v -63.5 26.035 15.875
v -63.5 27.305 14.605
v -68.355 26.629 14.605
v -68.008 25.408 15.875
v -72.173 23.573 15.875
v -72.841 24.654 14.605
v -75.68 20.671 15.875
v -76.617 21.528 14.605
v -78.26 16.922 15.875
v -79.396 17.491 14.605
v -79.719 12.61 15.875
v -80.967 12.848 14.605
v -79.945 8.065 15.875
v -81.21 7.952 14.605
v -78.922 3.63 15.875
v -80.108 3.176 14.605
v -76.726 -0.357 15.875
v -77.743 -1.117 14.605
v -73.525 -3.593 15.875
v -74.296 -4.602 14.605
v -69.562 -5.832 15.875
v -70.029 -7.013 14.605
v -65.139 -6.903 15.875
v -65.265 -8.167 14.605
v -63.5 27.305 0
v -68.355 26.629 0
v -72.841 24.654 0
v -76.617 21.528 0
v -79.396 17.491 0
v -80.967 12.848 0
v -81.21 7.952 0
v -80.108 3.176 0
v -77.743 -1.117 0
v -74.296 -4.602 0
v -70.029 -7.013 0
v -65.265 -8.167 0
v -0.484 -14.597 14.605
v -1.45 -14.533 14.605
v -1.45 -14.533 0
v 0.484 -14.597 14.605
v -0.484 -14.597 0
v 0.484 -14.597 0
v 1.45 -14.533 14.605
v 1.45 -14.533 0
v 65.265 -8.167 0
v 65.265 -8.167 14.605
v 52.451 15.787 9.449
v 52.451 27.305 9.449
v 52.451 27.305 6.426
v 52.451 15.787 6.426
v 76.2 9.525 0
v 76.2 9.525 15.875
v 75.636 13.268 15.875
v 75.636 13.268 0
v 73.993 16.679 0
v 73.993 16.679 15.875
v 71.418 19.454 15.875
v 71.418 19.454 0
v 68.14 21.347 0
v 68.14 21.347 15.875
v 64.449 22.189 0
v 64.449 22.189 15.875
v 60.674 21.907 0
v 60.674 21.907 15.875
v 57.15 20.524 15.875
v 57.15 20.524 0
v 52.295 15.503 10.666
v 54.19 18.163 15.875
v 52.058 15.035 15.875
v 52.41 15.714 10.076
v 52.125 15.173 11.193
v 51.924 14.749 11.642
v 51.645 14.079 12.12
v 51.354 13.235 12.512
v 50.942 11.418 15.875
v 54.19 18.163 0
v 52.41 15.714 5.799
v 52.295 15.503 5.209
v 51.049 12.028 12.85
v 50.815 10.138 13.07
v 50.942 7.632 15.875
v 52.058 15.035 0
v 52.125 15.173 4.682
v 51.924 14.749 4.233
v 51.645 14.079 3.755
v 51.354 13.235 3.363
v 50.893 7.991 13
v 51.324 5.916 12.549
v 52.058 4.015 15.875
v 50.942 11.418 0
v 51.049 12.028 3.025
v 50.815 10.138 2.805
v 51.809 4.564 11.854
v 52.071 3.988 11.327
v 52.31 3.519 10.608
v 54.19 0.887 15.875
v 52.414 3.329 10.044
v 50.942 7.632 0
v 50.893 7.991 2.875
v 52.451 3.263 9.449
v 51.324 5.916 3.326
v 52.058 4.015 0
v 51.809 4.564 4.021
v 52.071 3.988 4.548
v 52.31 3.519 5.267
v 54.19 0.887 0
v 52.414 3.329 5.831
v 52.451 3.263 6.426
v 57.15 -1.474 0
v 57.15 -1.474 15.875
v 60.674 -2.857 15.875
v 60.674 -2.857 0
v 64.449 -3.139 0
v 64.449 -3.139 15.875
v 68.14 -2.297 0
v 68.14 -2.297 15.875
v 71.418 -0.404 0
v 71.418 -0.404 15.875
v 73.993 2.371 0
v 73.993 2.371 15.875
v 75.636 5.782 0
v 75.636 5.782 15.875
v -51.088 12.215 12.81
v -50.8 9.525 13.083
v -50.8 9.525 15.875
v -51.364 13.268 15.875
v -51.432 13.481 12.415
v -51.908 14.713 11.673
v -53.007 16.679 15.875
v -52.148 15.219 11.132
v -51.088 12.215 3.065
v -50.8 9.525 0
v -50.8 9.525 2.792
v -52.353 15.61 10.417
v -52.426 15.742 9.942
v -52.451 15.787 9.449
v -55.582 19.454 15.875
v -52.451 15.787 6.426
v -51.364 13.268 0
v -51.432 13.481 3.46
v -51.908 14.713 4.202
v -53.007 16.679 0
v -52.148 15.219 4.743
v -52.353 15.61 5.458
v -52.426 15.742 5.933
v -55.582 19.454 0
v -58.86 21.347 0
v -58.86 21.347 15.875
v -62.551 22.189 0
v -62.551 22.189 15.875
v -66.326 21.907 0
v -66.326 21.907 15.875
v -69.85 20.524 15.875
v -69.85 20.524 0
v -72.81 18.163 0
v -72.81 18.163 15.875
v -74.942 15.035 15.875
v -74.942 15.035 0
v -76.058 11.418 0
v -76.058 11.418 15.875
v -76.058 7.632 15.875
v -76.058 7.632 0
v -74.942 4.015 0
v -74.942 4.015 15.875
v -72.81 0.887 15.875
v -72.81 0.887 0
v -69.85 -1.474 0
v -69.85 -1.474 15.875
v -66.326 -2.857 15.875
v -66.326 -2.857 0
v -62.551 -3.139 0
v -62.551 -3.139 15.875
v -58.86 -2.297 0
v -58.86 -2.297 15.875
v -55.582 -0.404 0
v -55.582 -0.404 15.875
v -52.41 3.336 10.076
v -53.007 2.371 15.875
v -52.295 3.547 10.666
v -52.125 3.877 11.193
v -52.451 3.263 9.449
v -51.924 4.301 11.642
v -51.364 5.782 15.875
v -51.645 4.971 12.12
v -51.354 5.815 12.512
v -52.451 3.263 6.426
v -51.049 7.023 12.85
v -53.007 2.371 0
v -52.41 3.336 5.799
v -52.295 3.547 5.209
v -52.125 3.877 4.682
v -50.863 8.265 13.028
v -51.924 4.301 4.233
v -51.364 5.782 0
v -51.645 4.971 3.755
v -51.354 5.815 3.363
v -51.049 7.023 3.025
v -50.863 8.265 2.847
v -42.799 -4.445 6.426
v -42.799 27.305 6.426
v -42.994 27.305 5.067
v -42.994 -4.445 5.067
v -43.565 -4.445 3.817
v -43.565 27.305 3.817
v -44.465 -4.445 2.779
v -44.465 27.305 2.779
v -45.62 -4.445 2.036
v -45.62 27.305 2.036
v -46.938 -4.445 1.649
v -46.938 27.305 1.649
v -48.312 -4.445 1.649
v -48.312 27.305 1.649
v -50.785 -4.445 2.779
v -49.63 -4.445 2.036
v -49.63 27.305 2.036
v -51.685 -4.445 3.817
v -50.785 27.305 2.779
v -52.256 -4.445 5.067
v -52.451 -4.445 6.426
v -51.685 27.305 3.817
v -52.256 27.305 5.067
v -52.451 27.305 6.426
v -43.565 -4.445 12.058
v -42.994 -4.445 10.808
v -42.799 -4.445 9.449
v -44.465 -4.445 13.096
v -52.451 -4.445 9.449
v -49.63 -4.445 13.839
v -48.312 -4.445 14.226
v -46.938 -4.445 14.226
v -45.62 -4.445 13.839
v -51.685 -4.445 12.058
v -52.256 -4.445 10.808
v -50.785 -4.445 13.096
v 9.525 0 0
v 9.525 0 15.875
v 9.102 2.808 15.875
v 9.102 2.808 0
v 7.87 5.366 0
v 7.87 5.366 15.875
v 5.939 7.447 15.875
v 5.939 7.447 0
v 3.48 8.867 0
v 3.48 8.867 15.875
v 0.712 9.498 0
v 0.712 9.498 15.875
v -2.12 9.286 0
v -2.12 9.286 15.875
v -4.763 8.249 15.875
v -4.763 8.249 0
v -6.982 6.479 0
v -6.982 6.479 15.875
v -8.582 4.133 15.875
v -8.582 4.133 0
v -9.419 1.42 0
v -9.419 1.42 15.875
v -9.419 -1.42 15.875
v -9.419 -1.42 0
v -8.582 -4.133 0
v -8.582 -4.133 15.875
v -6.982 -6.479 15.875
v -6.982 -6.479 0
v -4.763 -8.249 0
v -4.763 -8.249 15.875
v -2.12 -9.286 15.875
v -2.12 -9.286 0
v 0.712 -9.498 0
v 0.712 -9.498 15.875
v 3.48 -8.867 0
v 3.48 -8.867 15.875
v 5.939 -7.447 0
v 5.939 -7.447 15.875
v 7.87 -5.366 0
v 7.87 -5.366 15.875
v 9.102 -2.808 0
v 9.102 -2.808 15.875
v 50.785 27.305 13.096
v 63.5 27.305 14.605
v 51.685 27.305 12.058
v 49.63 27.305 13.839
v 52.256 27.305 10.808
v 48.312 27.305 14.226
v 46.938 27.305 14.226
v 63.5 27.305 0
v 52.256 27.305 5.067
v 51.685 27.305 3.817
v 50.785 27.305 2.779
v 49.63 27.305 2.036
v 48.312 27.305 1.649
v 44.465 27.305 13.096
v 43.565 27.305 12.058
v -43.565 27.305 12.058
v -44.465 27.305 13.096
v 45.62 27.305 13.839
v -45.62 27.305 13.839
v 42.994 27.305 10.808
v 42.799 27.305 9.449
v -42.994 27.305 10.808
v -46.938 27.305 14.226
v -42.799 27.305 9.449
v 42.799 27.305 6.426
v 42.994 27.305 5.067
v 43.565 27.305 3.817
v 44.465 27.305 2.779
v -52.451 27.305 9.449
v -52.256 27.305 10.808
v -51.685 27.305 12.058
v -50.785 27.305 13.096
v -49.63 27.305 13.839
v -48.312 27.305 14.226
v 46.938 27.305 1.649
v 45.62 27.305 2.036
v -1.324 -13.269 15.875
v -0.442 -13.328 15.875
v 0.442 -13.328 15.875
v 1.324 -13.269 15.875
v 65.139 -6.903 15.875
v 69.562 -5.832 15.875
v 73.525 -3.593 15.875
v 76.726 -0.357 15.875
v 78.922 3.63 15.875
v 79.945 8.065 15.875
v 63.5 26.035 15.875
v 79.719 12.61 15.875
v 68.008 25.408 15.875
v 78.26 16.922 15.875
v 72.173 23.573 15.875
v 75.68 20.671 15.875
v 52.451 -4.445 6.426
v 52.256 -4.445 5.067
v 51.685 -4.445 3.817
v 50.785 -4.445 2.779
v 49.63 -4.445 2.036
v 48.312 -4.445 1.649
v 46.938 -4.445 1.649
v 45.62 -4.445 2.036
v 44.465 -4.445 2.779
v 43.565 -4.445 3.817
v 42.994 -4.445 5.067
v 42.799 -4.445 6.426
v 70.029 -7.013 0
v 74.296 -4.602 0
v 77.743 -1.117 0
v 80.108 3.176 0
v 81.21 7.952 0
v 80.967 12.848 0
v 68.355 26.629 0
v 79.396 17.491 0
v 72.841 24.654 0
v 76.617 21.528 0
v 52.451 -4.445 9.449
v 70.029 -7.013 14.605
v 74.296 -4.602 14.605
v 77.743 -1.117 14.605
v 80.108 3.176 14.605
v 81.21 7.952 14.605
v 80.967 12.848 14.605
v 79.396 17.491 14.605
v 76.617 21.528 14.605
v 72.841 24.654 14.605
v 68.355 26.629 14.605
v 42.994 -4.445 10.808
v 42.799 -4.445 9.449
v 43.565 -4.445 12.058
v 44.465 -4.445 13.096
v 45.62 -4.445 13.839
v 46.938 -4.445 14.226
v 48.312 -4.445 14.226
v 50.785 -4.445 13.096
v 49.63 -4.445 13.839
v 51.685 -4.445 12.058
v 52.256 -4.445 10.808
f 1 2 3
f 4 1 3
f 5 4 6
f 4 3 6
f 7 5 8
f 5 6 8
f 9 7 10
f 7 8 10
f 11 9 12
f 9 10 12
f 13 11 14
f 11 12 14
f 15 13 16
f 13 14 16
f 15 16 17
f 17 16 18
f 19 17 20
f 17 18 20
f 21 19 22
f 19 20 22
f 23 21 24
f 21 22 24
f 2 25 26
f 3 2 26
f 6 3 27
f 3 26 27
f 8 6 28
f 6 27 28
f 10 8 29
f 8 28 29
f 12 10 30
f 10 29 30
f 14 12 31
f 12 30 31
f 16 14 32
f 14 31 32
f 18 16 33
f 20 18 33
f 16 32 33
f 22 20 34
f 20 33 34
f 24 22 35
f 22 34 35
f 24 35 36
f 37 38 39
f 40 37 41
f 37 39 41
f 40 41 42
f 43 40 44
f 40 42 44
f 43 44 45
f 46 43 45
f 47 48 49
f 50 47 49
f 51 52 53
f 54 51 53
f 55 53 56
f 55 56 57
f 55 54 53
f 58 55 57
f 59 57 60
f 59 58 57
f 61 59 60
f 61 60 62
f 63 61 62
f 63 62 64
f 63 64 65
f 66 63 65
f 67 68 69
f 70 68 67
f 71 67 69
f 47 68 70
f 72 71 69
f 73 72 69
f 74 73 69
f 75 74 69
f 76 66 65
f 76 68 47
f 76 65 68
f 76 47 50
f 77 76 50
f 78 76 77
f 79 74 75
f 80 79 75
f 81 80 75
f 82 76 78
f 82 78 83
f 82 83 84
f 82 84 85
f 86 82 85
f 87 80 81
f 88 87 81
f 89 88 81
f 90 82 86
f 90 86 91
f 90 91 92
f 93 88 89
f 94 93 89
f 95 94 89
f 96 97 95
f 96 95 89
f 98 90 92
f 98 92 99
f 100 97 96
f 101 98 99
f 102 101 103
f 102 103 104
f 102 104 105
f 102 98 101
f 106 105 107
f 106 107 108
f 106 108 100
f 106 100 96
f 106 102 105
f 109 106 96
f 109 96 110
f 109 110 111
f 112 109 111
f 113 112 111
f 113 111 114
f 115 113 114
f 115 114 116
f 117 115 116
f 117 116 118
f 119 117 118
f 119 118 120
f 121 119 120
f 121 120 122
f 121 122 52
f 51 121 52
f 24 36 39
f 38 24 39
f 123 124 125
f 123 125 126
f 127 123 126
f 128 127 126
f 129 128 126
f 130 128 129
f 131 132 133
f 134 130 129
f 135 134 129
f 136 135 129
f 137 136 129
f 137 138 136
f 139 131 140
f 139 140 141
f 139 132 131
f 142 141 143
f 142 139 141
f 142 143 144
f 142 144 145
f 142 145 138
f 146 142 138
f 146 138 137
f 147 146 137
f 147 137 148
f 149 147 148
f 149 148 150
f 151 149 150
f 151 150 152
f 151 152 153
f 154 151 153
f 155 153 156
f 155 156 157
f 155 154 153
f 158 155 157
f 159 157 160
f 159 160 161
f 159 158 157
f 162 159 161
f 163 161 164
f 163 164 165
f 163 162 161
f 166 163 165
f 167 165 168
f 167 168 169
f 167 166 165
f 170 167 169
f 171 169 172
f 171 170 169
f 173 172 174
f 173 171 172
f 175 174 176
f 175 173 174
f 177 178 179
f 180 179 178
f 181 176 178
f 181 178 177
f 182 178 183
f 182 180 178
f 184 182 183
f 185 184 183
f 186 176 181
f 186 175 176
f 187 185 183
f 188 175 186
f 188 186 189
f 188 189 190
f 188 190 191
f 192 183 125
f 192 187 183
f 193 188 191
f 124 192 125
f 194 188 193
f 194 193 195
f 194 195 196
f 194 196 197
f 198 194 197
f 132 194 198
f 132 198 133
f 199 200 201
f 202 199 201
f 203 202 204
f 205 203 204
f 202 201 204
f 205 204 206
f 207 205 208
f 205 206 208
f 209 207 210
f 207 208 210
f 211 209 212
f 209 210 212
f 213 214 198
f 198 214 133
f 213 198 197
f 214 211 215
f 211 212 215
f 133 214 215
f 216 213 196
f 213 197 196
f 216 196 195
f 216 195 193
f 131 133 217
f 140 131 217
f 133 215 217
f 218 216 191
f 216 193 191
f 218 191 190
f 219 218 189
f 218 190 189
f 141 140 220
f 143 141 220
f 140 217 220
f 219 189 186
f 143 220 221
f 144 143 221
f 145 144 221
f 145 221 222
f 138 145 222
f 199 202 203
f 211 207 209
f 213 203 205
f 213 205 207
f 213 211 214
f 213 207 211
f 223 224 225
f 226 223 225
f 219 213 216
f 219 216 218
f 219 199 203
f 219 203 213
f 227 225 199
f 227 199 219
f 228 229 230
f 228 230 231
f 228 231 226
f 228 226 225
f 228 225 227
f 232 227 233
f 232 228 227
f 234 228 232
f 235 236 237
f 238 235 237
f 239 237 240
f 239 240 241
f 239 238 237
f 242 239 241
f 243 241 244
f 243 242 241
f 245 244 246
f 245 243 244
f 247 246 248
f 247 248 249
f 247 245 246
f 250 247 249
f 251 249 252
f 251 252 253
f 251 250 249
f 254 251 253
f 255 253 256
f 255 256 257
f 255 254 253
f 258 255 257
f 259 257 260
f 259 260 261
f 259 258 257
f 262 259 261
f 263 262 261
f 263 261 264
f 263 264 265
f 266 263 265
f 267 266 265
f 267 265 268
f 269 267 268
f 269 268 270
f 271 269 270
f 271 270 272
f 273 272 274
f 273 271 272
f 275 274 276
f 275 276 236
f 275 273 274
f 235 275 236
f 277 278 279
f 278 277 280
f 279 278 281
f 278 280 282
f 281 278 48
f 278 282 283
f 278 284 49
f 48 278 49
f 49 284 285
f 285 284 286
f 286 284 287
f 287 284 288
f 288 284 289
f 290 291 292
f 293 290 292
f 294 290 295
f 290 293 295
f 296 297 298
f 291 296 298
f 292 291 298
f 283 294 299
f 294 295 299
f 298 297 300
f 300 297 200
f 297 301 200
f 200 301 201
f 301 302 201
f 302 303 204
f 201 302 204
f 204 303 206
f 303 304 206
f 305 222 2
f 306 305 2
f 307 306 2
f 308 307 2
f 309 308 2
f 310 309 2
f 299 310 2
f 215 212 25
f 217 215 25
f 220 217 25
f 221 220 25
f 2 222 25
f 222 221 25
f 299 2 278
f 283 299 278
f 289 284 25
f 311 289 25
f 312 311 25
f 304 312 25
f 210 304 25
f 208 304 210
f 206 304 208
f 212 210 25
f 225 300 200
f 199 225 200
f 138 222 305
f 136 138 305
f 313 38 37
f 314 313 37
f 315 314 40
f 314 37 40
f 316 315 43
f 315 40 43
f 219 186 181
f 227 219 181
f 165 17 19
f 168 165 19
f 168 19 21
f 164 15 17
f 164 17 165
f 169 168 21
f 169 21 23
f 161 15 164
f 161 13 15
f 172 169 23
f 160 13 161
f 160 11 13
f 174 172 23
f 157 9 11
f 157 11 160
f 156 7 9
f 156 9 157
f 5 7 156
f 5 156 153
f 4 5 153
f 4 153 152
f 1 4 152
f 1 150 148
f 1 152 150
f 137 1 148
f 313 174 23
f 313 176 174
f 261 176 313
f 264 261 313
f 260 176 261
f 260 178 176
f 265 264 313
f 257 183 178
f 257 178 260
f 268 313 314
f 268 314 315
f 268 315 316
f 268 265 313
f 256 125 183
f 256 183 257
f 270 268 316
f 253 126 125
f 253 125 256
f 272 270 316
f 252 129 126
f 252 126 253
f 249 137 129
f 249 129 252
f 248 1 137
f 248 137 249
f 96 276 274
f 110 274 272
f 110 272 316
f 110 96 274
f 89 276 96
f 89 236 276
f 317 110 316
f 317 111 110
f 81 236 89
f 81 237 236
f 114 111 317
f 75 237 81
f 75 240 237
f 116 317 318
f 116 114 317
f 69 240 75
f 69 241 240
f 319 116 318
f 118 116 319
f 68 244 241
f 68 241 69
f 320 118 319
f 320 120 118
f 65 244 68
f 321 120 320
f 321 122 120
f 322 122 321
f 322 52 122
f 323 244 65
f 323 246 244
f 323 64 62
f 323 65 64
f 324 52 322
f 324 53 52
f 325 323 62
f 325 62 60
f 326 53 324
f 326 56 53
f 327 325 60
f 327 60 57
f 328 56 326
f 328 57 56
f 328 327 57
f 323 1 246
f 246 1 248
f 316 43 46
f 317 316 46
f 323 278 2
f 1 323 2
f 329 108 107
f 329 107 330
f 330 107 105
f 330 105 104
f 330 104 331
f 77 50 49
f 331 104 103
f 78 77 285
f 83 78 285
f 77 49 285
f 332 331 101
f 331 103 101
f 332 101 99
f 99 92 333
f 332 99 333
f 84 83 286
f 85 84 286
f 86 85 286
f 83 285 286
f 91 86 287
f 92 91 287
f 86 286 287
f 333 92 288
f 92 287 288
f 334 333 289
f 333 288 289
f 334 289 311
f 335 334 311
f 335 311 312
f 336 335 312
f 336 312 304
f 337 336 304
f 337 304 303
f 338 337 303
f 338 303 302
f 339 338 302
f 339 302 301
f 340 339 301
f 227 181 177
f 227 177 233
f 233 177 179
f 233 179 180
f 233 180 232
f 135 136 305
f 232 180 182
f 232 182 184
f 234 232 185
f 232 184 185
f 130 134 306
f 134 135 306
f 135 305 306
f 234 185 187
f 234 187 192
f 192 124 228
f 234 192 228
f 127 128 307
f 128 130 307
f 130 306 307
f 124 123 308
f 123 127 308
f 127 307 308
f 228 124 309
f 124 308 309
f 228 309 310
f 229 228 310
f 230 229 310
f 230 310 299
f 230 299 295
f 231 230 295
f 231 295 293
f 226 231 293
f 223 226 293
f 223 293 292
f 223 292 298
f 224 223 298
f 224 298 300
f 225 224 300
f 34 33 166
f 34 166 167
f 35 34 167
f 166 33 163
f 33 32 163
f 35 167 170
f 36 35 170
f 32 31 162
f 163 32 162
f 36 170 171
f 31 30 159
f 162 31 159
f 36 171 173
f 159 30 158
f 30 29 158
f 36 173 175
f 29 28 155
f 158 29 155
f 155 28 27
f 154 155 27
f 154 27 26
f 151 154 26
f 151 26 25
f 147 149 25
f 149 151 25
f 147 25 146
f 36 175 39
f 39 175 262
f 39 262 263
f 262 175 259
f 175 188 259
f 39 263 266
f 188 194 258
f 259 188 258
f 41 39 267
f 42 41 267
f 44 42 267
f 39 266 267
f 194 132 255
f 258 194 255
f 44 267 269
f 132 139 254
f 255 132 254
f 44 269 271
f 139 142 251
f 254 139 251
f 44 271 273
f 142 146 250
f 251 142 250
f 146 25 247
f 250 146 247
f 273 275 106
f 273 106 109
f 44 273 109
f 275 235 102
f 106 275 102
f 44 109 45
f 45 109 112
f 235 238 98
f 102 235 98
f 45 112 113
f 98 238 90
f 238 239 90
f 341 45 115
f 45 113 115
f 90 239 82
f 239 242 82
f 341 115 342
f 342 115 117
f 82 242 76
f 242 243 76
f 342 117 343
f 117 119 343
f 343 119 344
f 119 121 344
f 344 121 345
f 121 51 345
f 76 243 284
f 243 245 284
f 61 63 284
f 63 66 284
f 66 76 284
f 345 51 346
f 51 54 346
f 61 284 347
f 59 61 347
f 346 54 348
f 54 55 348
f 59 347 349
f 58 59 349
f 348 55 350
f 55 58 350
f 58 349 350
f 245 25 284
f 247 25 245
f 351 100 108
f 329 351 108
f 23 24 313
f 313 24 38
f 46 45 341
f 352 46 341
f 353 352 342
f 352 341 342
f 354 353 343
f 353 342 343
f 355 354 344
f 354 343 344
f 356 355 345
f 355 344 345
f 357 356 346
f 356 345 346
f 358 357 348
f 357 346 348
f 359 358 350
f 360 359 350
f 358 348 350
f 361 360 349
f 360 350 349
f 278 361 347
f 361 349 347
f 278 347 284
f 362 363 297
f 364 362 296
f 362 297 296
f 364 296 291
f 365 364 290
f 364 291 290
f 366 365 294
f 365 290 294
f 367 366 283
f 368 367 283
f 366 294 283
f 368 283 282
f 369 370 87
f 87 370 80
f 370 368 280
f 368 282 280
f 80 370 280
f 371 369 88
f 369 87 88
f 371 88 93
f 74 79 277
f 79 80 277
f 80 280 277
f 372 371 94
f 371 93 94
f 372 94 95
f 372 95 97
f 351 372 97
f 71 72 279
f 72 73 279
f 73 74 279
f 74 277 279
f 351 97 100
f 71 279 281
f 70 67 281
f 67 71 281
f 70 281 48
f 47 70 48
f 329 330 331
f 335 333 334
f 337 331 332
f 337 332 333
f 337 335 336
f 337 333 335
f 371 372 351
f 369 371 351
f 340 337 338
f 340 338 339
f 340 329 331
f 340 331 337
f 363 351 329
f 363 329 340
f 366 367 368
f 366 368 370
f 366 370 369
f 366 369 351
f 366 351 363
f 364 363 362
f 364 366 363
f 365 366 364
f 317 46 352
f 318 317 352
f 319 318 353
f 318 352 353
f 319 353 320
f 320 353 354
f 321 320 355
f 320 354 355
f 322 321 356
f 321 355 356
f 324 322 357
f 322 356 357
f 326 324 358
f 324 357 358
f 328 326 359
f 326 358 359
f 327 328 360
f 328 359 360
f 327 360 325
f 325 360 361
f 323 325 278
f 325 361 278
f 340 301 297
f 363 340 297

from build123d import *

# Parameters (mm, degrees)
F0_R     = 9.525
F0_R_2   = 12.7
F1_DEPTH = 15.875
F3_DEPTH = 31.75
F4_SIZE  = 1.27


with BuildPart() as f1:
    # F0 (on Top) → F1 (new body)
    with BuildSketch(Plane.XY):
        with BuildLine():
            Line((63.5, 27.305), (-63.5, 27.305))
            ThreePointArc((-63.5, 27.305), (-81.258035, 10.408506), (-65.264829, -8.167195))
            Line((-65.264829, -8.167195), (-1.449681, -14.532875))
            ThreePointArc((-1.449681, -14.532875), (0, -14.605), (1.449681, -14.532875))
            Line((1.449681, -14.532875), (65.264829, -8.167195))
            ThreePointArc((65.264829, -8.167195), (81.258035, 10.408506), (63.5, 27.305))
        make_face()
        Circle(F0_R, mode=Mode.SUBTRACT)
        with Locations((-63.5, 9.525)):
            Circle(F0_R_2, mode=Mode.SUBTRACT)
        with Locations((63.5, 9.525)):
            Circle(F0_R_2, mode=Mode.SUBTRACT)
    extrude(amount=F1_DEPTH)

    # F2 (on face) → F3 (cut)
    with BuildSketch(Plane(origin=(0, 27.305, 0), x_dir=(-1, 0, 0), z_dir=(0, 1, 0))):
        with BuildLine():
            Line((52.451, 6.4262), (52.451, 9.4488))
            ThreePointArc((52.451, 9.4488), (47.625, 14.2748), (42.799, 9.4488))
            Line((42.799, 9.4488), (42.799, 6.4262))
            ThreePointArc((42.799, 6.4262), (47.625, 1.6002), (52.451, 6.4262))
        make_face()
        with BuildLine():
            ThreePointArc((-42.799, 9.4488), (-47.625, 14.2748), (-52.451, 9.4488))
            Line((-52.451, 9.4488), (-52.451, 6.4262))
            ThreePointArc((-52.451, 6.4262), (-47.625, 1.6002), (-42.799, 6.4262))
            Line((-42.799, 6.4262), (-42.799, 9.4488))
        make_face()
    extrude(amount=-F3_DEPTH, mode=Mode.SUBTRACT)

    # F4
    f4_edges = [f1.edges().sort_by_distance(p)[0] for p in [
        (-81.258035, 10.408506, 15.875),
    ]]
    chamfer(f4_edges, length=F4_SIZE)


solid = f1.part
